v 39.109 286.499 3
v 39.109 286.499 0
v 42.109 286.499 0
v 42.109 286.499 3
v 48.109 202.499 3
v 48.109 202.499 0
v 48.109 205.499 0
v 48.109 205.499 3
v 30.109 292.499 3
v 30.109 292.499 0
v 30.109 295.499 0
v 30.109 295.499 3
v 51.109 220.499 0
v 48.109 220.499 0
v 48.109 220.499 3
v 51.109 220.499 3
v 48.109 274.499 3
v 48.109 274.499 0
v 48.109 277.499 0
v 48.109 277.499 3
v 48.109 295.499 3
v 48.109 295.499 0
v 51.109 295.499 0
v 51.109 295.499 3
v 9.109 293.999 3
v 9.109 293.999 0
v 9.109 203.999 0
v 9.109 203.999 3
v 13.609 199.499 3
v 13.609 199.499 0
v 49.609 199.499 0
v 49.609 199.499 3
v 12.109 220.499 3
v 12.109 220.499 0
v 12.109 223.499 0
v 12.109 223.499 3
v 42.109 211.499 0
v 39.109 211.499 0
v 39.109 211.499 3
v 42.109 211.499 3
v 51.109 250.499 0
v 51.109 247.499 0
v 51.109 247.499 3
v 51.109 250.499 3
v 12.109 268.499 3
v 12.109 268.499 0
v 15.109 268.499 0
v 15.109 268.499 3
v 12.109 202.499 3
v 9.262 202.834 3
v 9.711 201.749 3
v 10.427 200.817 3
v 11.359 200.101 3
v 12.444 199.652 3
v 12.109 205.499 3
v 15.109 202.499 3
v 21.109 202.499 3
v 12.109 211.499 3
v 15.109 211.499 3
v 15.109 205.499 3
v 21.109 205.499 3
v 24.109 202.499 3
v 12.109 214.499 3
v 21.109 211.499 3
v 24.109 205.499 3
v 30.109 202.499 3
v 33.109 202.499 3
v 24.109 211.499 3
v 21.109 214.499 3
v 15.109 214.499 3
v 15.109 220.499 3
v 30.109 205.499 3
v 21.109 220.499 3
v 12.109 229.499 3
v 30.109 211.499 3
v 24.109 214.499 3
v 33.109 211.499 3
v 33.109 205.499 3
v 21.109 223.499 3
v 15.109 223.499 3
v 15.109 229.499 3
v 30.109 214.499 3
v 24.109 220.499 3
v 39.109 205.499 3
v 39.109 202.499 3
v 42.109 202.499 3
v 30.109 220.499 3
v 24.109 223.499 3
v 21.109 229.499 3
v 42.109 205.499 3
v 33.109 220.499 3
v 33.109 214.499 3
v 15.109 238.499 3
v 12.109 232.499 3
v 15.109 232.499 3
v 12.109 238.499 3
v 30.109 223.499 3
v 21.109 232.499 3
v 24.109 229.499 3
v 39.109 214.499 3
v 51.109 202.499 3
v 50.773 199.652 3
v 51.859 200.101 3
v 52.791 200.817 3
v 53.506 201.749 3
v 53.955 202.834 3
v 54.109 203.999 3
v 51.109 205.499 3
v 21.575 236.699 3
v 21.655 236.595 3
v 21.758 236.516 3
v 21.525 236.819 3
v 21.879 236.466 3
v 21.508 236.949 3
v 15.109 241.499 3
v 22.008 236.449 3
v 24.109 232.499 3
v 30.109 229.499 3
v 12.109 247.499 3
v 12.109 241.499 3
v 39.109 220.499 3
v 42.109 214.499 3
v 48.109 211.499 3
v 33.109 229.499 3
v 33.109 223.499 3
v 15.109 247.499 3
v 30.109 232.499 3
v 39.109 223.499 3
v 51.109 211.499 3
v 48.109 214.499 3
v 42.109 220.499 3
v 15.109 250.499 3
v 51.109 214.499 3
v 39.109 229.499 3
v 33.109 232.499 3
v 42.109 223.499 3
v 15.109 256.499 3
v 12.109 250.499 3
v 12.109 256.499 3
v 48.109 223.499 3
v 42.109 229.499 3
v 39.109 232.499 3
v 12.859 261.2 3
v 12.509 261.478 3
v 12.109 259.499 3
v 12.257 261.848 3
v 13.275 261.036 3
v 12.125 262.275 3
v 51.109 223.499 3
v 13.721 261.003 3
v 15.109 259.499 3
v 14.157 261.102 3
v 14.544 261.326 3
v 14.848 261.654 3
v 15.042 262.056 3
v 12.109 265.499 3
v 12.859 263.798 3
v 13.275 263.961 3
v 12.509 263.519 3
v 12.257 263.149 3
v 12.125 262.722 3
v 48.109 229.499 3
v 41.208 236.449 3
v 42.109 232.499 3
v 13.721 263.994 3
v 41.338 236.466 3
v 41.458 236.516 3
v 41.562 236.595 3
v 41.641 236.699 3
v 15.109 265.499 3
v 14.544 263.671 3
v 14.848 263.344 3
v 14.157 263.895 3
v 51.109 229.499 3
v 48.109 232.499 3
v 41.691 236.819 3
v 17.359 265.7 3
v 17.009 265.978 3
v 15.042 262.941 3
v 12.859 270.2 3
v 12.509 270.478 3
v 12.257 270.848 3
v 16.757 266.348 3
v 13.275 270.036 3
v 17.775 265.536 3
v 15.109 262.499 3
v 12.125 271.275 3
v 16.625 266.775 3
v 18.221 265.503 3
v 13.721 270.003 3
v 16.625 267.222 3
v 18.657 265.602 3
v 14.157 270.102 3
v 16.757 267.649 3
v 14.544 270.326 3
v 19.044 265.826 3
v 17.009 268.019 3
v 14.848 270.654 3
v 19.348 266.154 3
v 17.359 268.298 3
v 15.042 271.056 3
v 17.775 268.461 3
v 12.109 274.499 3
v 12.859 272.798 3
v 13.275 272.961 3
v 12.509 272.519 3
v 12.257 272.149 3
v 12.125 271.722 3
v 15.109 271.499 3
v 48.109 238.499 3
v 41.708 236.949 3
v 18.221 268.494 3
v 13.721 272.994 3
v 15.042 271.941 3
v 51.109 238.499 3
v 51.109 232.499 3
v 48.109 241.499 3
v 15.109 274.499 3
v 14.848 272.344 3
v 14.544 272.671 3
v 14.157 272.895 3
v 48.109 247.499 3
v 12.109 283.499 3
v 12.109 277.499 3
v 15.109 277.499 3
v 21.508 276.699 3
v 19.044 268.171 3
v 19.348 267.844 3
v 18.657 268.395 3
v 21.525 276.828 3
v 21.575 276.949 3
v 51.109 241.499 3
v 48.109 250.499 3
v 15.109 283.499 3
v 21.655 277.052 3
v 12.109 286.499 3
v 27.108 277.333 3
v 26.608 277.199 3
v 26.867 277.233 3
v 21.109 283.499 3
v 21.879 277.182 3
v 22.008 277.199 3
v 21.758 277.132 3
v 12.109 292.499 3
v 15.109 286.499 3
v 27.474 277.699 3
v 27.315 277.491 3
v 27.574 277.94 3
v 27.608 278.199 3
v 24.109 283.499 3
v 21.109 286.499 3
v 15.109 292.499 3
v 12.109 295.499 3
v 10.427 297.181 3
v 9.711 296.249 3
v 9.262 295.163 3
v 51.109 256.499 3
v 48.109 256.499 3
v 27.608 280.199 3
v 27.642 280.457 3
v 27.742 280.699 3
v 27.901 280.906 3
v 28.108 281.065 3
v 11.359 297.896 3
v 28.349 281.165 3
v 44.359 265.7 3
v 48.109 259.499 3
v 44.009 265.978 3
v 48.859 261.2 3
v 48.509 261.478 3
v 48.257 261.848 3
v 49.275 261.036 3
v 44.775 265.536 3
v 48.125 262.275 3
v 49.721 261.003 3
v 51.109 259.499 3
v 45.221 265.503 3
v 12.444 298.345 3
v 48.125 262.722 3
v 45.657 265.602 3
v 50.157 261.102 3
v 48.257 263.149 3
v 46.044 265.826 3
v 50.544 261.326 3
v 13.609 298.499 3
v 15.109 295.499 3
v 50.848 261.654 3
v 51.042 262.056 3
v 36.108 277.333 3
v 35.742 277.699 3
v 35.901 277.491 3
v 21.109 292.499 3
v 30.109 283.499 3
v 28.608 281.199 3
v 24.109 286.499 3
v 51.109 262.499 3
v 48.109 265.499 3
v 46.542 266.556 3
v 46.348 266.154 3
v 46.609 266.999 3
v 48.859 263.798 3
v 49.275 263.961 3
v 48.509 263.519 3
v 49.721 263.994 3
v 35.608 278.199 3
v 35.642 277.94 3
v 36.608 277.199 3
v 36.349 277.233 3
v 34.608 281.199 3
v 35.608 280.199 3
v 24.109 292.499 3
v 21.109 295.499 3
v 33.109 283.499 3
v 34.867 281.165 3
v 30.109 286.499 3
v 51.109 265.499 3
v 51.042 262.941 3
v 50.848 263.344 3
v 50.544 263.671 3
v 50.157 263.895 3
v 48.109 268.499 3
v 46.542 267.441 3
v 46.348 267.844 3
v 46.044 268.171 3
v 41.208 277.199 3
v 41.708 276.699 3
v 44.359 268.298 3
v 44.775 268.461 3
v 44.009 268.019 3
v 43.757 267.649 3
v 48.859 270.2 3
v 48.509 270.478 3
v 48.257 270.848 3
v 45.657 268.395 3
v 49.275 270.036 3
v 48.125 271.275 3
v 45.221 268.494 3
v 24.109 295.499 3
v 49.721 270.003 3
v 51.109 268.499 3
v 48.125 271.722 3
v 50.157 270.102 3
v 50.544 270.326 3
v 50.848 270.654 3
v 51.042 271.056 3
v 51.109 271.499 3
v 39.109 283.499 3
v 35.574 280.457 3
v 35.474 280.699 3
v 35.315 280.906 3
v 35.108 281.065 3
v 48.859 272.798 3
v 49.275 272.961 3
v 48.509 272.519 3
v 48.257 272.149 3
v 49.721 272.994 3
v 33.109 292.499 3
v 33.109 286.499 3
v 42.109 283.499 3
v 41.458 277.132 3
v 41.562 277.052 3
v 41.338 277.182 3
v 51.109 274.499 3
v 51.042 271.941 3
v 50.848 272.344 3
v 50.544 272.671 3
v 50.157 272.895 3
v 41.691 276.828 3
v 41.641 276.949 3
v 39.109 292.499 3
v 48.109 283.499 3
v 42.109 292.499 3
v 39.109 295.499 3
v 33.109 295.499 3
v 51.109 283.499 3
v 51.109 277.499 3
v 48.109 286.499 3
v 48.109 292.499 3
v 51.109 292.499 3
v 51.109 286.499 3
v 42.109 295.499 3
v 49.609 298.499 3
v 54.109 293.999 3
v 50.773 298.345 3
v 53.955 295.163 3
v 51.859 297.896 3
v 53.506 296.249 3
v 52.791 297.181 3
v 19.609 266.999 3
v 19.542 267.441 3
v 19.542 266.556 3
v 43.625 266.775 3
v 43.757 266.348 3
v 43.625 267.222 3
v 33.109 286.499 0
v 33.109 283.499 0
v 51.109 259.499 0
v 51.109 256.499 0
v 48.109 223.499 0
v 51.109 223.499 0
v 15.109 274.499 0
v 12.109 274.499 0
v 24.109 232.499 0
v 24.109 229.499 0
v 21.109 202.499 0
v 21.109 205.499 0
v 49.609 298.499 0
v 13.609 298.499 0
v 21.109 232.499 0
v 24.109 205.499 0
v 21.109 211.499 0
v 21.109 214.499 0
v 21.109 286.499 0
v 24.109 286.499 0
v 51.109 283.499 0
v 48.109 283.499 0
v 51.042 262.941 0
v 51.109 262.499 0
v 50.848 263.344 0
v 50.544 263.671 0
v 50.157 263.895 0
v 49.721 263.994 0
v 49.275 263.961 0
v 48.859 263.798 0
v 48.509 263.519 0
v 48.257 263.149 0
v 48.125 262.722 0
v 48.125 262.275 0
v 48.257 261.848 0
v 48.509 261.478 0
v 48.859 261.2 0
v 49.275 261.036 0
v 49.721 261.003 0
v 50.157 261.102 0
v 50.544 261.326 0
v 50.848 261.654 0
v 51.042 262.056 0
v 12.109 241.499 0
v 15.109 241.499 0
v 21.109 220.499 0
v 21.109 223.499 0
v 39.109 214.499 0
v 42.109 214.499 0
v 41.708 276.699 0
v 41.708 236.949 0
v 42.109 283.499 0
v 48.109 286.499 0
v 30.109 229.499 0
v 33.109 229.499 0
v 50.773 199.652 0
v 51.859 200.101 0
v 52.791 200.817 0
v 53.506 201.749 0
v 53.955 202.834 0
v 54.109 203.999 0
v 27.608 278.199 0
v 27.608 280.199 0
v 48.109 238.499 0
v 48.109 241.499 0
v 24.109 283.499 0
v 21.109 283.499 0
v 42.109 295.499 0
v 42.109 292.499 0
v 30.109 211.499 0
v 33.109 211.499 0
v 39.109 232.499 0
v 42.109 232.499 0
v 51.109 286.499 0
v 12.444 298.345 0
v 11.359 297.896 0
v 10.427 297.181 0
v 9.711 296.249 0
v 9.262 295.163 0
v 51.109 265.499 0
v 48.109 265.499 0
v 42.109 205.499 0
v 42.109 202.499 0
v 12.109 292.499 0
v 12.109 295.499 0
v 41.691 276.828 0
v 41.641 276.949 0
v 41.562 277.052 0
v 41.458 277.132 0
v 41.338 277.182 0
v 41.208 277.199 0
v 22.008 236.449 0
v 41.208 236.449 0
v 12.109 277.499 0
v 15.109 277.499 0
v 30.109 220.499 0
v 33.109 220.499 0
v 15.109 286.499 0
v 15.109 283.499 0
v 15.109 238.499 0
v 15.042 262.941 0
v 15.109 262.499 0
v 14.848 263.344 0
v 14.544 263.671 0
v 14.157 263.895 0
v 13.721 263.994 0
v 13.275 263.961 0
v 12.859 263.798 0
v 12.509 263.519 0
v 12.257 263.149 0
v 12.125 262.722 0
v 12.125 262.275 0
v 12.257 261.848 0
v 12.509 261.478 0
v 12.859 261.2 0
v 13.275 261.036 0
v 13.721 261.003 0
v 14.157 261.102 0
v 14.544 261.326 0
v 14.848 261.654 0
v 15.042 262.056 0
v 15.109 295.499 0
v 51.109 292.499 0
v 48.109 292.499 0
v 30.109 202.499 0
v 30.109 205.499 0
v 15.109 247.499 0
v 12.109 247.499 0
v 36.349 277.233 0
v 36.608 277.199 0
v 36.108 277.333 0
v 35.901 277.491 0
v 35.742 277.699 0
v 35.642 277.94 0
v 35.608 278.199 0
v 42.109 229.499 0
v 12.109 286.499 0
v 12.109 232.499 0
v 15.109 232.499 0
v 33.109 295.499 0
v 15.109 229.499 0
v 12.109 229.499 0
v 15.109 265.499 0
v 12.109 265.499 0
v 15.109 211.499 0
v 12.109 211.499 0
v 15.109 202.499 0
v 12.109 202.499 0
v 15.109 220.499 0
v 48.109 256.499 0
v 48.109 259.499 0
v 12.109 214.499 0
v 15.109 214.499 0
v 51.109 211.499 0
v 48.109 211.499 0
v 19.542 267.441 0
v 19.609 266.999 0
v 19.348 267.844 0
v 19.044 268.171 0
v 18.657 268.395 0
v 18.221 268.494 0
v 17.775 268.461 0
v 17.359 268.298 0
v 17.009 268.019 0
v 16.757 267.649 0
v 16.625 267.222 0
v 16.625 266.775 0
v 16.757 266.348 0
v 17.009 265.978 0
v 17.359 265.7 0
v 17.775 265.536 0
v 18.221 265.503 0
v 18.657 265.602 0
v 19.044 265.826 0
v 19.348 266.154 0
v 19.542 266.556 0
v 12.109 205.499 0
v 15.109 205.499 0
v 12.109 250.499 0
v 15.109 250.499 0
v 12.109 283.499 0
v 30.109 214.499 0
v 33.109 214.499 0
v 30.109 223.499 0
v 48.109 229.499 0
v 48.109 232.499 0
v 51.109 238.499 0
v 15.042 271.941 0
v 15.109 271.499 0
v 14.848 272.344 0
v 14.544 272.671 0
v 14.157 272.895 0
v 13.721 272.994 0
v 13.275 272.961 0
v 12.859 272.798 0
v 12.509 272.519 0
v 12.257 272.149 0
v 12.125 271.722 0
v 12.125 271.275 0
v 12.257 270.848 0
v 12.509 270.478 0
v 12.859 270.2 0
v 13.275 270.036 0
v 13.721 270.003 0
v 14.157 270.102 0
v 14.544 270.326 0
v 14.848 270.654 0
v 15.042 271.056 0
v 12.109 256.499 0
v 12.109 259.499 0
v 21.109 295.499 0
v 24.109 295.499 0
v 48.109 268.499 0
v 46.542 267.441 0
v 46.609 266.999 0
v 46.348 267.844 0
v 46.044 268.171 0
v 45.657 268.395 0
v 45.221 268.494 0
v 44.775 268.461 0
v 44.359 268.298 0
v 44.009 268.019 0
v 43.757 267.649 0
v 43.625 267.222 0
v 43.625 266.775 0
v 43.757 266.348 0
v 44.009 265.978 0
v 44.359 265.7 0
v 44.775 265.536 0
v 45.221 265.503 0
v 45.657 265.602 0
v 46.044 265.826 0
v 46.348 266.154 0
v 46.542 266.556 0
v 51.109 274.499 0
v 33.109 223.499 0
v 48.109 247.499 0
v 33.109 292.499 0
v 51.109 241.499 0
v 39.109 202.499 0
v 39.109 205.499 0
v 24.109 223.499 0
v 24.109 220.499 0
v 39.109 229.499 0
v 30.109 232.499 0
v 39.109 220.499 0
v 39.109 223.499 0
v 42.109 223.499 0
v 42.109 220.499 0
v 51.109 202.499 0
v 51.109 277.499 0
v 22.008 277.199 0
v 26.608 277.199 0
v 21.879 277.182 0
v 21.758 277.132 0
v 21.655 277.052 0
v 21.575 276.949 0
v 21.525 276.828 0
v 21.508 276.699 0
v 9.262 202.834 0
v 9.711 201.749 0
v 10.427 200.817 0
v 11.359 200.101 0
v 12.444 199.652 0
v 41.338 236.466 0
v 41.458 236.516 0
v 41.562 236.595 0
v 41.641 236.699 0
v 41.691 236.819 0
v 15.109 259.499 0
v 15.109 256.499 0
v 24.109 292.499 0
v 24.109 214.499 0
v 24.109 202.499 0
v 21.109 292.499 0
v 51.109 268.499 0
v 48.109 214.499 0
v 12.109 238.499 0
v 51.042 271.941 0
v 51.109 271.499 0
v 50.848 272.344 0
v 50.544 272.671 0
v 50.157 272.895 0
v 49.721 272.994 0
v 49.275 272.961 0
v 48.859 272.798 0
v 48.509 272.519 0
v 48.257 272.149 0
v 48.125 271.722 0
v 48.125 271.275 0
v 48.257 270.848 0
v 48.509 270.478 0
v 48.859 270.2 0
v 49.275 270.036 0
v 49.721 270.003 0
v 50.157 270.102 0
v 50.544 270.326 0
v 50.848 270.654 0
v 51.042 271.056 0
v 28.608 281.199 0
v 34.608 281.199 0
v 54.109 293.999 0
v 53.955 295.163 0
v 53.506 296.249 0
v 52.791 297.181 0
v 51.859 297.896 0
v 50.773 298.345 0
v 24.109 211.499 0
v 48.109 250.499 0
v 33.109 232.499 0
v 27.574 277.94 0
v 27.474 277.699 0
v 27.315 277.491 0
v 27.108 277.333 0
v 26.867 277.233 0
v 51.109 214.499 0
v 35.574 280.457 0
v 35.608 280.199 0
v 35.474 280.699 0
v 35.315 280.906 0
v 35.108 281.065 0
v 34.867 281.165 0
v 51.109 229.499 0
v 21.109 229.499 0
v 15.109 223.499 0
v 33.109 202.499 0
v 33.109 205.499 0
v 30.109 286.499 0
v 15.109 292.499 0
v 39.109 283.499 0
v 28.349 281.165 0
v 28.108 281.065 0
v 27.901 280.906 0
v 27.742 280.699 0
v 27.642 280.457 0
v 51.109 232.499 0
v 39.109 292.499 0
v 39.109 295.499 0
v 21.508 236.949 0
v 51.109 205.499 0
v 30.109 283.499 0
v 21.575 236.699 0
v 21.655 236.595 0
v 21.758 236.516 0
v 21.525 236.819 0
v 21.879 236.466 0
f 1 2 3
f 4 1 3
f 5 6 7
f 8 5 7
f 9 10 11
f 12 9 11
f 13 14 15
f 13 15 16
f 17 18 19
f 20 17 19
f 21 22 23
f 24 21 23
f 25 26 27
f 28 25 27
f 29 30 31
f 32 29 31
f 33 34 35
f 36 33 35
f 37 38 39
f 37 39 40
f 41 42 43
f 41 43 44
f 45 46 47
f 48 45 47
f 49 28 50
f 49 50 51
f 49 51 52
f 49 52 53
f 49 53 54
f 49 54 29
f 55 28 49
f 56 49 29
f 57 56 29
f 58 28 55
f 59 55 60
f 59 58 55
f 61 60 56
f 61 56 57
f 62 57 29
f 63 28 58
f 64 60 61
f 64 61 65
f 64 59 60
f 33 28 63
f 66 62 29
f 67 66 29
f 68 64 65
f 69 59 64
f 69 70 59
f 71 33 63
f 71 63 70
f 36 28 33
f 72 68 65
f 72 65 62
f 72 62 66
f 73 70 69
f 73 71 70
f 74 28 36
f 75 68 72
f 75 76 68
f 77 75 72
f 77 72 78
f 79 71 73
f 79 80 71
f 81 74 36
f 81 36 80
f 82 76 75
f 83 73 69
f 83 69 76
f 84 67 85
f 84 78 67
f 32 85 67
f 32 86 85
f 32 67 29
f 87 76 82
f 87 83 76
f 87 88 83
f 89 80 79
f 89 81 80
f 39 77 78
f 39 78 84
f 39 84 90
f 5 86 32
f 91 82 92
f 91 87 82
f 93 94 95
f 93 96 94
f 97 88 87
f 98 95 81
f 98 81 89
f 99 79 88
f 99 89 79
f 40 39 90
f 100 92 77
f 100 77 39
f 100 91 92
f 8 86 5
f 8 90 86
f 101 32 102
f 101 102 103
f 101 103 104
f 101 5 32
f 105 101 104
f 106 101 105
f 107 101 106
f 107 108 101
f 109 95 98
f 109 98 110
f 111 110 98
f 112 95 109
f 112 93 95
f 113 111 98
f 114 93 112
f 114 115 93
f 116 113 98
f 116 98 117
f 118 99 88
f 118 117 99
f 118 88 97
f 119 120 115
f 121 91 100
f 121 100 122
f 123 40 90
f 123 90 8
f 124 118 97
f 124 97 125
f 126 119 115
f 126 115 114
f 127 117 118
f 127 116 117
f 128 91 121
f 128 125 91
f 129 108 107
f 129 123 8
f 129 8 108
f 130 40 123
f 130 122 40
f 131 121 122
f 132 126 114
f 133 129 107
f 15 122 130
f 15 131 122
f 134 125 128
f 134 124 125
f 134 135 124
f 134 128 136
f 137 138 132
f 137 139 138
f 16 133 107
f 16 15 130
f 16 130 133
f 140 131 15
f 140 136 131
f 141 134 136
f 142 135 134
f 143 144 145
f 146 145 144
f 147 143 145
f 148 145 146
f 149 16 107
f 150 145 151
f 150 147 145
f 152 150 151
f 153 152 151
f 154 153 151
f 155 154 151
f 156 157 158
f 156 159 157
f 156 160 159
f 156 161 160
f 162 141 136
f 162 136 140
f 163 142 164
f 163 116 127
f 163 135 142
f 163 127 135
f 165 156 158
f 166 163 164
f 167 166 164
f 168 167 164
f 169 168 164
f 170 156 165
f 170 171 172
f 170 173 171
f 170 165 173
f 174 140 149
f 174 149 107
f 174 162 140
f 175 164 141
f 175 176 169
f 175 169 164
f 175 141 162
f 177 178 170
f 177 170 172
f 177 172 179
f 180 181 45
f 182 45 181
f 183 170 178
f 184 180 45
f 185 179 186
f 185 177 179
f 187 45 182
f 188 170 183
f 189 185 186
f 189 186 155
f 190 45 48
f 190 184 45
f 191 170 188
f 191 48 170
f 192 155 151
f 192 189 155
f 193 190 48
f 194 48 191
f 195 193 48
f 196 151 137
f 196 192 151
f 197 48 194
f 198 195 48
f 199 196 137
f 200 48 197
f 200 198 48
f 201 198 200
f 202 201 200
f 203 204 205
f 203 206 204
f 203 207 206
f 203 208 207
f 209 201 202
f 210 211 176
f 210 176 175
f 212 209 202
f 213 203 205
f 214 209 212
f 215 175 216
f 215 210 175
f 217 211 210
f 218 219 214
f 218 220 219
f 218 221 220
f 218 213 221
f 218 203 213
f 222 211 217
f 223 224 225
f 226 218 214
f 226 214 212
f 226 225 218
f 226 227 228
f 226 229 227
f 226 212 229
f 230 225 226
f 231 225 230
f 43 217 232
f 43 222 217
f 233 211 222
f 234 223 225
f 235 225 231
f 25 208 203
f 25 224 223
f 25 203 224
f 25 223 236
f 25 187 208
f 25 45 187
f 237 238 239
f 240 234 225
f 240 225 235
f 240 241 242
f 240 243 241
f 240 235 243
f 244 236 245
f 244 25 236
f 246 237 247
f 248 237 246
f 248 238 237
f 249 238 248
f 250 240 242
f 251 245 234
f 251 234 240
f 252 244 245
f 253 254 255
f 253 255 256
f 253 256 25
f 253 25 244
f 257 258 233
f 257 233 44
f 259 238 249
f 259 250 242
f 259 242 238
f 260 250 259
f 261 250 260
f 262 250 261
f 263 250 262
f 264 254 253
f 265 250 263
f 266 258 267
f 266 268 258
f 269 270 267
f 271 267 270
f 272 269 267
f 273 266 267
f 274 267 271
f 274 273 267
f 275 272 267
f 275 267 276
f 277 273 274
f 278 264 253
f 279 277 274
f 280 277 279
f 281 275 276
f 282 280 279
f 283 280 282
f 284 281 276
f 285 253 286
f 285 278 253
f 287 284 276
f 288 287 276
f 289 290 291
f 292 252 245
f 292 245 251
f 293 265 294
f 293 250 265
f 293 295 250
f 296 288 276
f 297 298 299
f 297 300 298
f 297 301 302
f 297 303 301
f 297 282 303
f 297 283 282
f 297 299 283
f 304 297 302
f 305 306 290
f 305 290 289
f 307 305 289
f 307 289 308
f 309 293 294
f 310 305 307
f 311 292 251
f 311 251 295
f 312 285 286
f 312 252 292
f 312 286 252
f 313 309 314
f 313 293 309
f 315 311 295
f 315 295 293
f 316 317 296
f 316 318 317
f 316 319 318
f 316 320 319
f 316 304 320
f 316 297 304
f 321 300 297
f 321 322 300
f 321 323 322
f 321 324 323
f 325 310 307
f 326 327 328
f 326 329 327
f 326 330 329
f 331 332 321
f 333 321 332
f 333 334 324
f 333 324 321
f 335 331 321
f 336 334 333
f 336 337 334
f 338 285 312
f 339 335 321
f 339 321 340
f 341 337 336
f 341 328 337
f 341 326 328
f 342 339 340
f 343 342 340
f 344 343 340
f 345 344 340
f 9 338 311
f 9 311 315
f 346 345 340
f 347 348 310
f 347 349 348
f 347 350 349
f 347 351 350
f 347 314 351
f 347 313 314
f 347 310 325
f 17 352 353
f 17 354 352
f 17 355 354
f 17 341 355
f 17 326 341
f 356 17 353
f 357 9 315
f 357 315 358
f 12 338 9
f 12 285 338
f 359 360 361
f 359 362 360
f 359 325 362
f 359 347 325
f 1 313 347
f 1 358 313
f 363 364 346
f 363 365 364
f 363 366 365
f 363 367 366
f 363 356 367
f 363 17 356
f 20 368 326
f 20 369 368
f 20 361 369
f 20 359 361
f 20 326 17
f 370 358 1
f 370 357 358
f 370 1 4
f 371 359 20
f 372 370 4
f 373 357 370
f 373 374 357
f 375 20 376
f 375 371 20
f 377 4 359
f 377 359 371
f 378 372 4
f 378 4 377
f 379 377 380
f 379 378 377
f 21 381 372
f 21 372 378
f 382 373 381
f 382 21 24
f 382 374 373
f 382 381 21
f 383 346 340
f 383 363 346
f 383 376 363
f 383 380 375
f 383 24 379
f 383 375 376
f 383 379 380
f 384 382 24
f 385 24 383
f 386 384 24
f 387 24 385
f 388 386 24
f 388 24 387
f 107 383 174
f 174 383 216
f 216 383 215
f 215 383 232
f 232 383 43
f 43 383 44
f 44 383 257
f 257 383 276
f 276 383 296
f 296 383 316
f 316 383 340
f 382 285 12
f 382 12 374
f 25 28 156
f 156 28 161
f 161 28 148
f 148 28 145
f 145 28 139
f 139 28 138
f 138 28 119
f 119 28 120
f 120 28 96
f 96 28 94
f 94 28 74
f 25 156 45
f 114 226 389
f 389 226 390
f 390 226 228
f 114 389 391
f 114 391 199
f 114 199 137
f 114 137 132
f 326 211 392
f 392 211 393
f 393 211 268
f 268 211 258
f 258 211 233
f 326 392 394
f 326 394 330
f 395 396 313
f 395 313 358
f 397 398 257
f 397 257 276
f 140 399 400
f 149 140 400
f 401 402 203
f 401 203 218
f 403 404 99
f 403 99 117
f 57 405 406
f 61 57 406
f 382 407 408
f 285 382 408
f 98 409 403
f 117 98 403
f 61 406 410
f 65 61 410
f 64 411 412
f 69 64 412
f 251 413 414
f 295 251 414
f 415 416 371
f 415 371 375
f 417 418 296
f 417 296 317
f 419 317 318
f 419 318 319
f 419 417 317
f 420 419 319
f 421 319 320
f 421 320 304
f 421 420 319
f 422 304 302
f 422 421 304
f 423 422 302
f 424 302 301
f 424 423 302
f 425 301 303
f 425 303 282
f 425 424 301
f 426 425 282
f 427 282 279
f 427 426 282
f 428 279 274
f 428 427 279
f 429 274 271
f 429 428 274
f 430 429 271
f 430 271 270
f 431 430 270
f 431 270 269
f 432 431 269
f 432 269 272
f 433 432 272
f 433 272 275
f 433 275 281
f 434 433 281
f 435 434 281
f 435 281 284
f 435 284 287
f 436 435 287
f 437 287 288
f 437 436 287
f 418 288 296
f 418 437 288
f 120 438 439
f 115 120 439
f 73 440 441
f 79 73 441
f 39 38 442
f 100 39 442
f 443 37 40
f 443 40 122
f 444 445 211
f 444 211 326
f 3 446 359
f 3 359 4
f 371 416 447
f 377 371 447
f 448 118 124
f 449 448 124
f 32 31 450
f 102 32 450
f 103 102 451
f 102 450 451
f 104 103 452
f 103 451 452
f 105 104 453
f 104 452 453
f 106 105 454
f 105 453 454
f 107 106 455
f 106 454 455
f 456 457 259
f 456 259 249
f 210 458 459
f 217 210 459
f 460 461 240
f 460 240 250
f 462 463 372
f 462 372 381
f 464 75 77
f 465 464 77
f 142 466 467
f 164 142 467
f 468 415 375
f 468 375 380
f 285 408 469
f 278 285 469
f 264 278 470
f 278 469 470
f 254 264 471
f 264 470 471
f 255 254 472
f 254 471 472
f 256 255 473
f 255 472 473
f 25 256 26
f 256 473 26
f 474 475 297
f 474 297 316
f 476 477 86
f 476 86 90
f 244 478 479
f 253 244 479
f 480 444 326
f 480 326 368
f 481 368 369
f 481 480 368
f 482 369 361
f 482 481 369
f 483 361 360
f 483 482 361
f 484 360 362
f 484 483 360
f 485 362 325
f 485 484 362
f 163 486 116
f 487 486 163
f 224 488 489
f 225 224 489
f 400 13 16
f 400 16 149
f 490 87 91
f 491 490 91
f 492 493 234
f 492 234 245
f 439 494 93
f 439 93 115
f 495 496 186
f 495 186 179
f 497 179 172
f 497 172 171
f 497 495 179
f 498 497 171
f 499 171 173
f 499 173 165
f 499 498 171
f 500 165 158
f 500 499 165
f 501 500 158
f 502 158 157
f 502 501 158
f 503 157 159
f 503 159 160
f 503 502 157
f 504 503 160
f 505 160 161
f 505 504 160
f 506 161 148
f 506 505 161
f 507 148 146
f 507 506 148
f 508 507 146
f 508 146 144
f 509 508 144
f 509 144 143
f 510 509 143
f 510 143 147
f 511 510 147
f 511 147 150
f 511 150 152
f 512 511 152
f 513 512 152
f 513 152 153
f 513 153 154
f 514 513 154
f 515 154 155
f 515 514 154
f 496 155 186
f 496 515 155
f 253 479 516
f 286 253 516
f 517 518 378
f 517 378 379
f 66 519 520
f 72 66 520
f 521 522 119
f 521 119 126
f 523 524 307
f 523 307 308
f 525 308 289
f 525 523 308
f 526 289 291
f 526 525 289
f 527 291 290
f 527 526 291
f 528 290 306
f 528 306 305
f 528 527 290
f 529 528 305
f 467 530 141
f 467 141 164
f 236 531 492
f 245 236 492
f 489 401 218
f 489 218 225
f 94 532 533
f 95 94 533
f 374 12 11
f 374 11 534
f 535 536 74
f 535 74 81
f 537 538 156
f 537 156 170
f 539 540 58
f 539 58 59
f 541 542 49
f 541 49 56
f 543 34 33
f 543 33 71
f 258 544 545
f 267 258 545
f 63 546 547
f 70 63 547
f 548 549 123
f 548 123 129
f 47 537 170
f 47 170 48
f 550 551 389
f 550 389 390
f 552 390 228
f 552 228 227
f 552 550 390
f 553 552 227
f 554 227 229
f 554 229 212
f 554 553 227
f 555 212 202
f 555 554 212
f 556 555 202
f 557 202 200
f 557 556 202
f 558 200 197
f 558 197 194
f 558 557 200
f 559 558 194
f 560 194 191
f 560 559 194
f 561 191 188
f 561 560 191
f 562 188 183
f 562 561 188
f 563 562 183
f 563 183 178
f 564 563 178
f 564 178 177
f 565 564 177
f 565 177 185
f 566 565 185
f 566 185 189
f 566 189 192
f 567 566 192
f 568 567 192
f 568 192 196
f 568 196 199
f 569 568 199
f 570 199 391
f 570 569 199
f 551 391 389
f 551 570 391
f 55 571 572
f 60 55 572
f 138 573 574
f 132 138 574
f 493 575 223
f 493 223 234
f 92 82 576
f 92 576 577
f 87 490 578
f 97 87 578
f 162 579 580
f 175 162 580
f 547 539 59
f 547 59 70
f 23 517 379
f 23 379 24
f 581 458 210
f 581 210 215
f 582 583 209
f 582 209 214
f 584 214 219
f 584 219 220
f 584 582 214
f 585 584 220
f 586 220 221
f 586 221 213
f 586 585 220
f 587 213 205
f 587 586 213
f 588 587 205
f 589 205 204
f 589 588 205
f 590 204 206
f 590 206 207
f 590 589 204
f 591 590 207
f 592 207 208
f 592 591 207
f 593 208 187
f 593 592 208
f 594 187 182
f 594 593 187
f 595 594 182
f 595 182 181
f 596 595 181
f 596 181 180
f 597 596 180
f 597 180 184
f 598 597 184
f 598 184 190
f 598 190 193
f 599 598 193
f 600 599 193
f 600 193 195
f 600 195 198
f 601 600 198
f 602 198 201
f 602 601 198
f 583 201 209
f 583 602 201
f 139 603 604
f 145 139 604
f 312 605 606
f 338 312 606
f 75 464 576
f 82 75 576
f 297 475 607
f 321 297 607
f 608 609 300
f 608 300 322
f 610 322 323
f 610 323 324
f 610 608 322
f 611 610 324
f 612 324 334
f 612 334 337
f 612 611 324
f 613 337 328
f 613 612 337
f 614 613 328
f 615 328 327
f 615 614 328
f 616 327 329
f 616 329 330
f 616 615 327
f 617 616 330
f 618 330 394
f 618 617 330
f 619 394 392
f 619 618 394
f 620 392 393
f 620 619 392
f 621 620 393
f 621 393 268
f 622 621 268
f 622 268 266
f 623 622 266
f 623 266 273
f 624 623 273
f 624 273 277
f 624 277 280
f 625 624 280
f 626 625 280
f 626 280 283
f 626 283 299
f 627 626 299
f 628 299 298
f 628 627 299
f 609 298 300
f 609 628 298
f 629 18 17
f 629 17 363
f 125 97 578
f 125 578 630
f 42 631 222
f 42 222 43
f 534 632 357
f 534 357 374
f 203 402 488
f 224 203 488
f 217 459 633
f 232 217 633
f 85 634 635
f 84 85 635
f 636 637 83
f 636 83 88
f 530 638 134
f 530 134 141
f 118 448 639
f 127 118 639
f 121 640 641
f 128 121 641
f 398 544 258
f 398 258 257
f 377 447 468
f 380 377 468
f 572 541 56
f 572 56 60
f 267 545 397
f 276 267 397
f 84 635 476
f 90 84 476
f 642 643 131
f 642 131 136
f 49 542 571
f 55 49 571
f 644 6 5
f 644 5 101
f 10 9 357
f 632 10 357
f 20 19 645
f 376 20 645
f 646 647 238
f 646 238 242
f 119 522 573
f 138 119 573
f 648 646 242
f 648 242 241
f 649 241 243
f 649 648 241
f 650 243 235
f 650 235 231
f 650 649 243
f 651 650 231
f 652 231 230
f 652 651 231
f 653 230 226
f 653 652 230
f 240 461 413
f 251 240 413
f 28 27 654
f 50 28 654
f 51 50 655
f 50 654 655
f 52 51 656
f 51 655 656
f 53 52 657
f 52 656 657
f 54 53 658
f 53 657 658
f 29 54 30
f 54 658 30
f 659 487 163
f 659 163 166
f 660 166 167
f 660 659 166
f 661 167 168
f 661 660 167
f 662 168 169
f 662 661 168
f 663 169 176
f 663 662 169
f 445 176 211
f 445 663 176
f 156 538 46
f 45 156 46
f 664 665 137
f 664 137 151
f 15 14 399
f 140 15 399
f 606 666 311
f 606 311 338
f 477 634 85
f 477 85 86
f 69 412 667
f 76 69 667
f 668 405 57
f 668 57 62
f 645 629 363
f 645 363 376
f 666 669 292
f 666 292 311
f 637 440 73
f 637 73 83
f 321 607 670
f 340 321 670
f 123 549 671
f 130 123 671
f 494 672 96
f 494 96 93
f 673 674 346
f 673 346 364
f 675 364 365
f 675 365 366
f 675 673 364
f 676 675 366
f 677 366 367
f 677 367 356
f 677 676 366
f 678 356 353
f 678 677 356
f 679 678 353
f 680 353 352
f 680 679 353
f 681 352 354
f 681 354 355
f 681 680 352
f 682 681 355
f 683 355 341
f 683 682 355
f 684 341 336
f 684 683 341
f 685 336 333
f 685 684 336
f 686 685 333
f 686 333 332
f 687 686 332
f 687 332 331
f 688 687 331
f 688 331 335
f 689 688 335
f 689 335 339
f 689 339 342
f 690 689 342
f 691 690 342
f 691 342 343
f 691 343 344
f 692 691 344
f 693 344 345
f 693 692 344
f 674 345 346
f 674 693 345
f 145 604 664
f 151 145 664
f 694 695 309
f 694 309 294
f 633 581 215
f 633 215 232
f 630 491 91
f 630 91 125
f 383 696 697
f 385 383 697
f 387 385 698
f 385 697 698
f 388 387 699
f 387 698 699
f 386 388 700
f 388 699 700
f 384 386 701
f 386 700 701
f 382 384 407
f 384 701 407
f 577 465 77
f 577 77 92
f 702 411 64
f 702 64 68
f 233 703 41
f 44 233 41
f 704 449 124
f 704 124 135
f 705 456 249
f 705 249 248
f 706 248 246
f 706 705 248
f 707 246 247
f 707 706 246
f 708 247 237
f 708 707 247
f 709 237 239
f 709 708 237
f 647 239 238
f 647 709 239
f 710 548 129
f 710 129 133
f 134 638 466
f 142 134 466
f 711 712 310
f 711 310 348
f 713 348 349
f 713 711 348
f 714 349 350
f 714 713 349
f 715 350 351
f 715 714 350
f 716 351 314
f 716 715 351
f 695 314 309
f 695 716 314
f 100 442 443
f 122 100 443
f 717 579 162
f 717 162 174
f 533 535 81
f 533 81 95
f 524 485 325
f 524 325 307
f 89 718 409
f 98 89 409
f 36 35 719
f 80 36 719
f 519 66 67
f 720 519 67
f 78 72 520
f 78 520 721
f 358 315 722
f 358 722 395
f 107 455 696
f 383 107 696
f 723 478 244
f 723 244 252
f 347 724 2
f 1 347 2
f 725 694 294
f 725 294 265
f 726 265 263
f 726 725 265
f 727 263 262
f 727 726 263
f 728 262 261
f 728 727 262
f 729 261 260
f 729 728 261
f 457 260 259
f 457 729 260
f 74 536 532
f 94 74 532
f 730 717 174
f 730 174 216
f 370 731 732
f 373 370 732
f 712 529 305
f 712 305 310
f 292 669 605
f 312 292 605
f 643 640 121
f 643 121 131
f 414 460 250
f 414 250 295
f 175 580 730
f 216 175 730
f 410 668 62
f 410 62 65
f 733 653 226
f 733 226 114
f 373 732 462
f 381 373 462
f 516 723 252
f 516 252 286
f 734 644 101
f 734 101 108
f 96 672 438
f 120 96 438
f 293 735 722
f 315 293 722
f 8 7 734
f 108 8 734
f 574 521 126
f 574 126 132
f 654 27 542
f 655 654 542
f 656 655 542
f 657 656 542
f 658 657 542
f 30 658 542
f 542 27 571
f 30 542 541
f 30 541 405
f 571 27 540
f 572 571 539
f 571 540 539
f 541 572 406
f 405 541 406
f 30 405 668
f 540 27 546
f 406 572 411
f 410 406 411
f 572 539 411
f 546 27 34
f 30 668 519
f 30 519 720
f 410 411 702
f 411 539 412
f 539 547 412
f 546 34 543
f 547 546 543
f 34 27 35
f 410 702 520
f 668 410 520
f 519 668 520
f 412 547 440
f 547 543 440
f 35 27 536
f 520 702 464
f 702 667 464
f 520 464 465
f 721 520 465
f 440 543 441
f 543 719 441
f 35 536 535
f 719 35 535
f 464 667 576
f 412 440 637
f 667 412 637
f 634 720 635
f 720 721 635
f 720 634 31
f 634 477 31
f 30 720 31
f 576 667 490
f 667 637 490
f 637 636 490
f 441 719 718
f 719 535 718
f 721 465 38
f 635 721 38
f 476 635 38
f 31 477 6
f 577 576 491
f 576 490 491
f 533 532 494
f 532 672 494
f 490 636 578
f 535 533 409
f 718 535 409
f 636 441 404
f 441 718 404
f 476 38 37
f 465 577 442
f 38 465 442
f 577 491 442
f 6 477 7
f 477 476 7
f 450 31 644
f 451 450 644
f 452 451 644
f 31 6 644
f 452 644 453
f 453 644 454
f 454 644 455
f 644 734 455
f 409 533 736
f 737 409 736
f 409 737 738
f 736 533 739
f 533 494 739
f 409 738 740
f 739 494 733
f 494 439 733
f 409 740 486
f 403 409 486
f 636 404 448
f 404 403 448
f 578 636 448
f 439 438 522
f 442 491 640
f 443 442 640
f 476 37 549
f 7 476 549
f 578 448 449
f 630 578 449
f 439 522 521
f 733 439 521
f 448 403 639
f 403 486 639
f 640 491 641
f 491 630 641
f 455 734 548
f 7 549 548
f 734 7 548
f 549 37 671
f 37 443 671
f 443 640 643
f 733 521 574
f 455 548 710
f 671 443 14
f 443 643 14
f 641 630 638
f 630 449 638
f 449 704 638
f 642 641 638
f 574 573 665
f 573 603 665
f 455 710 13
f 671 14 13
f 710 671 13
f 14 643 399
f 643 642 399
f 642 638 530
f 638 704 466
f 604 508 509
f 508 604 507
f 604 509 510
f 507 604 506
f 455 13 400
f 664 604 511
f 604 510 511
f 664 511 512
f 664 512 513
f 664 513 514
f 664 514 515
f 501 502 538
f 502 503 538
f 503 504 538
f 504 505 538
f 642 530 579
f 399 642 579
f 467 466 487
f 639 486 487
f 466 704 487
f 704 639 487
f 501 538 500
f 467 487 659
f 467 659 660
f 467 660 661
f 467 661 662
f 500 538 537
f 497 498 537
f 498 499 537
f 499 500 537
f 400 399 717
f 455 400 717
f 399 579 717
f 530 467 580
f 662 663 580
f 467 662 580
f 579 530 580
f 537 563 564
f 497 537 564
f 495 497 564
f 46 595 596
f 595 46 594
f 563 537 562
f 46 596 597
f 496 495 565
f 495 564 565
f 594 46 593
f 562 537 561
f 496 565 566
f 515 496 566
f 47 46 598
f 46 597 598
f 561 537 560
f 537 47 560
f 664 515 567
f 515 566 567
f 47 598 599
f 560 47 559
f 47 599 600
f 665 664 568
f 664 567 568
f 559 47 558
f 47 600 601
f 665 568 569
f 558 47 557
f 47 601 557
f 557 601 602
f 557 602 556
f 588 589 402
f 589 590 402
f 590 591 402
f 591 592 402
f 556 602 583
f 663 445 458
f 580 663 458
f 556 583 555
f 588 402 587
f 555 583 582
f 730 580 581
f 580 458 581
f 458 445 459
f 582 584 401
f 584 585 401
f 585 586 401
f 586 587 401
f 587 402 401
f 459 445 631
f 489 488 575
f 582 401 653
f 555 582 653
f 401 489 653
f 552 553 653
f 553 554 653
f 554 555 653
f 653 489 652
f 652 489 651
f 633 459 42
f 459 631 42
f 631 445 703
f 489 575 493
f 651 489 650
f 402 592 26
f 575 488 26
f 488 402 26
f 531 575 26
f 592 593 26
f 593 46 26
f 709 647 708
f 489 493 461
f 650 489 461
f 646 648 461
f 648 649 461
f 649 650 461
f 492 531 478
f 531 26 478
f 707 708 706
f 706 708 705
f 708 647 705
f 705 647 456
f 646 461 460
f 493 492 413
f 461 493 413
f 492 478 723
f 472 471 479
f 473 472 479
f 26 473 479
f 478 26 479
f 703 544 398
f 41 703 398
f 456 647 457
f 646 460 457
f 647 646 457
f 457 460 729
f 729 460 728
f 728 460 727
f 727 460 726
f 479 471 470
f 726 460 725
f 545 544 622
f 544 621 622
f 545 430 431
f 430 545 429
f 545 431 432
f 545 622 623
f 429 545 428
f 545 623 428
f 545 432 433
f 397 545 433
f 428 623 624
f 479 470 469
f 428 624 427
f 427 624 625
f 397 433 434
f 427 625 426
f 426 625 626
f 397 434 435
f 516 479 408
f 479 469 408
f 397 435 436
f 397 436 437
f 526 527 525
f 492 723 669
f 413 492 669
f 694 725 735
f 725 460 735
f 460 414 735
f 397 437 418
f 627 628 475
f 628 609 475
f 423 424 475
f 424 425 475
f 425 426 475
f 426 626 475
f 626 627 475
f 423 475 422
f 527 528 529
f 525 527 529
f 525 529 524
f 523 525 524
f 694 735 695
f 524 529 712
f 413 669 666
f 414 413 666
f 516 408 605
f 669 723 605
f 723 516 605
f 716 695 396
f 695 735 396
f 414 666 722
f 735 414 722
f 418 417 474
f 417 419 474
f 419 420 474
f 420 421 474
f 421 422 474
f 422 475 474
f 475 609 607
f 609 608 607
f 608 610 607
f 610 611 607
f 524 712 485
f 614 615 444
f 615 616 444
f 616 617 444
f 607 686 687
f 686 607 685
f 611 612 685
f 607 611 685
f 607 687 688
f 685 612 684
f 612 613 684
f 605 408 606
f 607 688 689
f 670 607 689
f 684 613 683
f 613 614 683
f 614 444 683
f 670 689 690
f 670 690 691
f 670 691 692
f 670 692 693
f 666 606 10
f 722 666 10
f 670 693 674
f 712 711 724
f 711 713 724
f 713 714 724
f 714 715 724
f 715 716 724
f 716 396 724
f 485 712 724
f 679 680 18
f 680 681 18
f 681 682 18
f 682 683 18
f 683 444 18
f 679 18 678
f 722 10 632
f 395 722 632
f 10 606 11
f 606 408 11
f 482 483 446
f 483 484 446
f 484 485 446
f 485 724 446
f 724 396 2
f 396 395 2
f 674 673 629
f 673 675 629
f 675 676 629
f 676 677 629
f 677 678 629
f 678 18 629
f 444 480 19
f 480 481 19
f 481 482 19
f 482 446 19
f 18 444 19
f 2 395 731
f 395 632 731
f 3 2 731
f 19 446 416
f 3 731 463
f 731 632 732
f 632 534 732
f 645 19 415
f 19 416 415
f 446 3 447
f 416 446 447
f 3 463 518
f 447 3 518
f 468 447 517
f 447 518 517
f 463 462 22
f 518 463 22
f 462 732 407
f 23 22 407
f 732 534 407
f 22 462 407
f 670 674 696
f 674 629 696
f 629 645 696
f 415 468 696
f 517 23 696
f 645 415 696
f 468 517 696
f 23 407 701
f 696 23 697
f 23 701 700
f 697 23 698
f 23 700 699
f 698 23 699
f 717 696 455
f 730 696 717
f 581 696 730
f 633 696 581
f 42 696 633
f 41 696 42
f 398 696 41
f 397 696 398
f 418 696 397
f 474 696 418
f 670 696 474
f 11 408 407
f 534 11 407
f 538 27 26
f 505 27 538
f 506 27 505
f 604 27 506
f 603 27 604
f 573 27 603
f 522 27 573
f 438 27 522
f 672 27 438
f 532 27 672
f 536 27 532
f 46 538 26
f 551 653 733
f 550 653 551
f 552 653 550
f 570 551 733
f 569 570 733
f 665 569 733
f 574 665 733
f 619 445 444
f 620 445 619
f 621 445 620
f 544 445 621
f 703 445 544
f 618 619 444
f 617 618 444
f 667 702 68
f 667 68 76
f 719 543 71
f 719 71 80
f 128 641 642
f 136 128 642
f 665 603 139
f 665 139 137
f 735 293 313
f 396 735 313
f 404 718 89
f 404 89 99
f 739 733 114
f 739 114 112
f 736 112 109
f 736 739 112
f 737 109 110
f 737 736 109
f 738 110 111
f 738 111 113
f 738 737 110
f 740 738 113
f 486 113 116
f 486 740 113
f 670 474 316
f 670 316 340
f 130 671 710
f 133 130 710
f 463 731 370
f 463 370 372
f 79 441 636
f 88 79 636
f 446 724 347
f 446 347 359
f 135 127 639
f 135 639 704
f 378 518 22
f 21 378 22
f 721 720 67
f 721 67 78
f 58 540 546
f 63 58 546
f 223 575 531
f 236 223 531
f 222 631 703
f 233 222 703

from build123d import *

# Parameters (mm, degrees)
MODEL_R                 = 1.5
MODEL_W                 = 3
MODEL_H                 = 3
SALIENTE_EXTRUIR1_DEPTH = 3


with BuildPart() as part:
    # Model → Saliente-Extruir1 (new body)
    with BuildSketch(Plane.XY):
        with BuildLine():
            Line((13.608524471, 199.498543913), (49.608524471, 199.498543913))
            ThreePointArc((49.608524471, 199.498543913), (52.790504986, 200.816563398), (54.108524471, 203.998543913))
            Line((54.108524471, 203.998543913), (54.108524471, 293.998543913))
            ThreePointArc((54.108524471, 293.998543913), (52.790504986, 297.180524429), (49.608524471, 298.498543913))
            Line((49.608524471, 298.498543913), (13.608524471, 298.498543913))
            ThreePointArc((13.608524471, 298.498543913), (10.426543955, 297.180524429), (9.108524471, 293.998543913))
            Line((9.108524471, 293.998543913), (9.108524471, 203.998543913))
            ThreePointArc((9.108524471, 203.998543913), (10.426543955, 200.816563398), (13.608524471, 199.498543913))
        make_face()
        with Locations((45.108524471, 266.998543913)):
            Circle(MODEL_R, mode=Mode.SUBTRACT)
        with Locations((18.108524471, 266.998543913)):
            Circle(MODEL_R, mode=Mode.SUBTRACT)
        with Locations((49.608524471, 262.498543913)):
            Circle(MODEL_R, mode=Mode.SUBTRACT)
        with Locations((49.608524471, 271.498543913)):
            Circle(MODEL_R, mode=Mode.SUBTRACT)
        with Locations((13.608524471, 262.498543913)):
            Circle(MODEL_R, mode=Mode.SUBTRACT)
        with Locations((13.608524471, 271.498543913)):
            Circle(MODEL_R, mode=Mode.SUBTRACT)
        with Locations((49.608524471, 293.998543913)):
            Rectangle(MODEL_W, MODEL_H, mode=Mode.SUBTRACT)
        with Locations((49.608524471, 284.998543913)):
            Rectangle(MODEL_W, MODEL_H, mode=Mode.SUBTRACT)
        with Locations((49.608524471, 275.998543913)):
            Rectangle(MODEL_W, MODEL_H, mode=Mode.SUBTRACT)
        with Locations((49.608524471, 266.998543913)):
            Rectangle(MODEL_W, MODEL_H, mode=Mode.SUBTRACT)
        with Locations((49.608524471, 257.998543913)):
            Rectangle(MODEL_W, MODEL_H, mode=Mode.SUBTRACT)
        with Locations((49.608524471, 248.998543913)):
            Rectangle(MODEL_W, MODEL_H, mode=Mode.SUBTRACT)
        with Locations((49.608524471, 239.998543913)):
            Rectangle(MODEL_W, MODEL_H, mode=Mode.SUBTRACT)
        with Locations((49.608524471, 230.998543913)):
            Rectangle(MODEL_W, MODEL_H, mode=Mode.SUBTRACT)
        with Locations((49.608524471, 221.998543913)):
            Rectangle(MODEL_W, MODEL_H, mode=Mode.SUBTRACT)
        with Locations((49.608524471, 212.998543913)):
            Rectangle(MODEL_W, MODEL_H, mode=Mode.SUBTRACT)
        with Locations((49.608524471, 203.998543913)):
            Rectangle(MODEL_W, MODEL_H, mode=Mode.SUBTRACT)
        with Locations((13.608524471, 293.998543913)):
            Rectangle(MODEL_W, MODEL_H, mode=Mode.SUBTRACT)
        with Locations((13.608524471, 284.998543913)):
            Rectangle(MODEL_W, MODEL_H, mode=Mode.SUBTRACT)
        with Locations((13.608524471, 275.998543913)):
            Rectangle(MODEL_W, MODEL_H, mode=Mode.SUBTRACT)
        with Locations((13.608524471, 266.998543913)):
            Rectangle(MODEL_W, MODEL_H, mode=Mode.SUBTRACT)
        with Locations((13.608524471, 257.998543913)):
            Rectangle(MODEL_W, MODEL_H, mode=Mode.SUBTRACT)
        with Locations((13.608524471, 248.998543913)):
            Rectangle(MODEL_W, MODEL_H, mode=Mode.SUBTRACT)
        with Locations((13.608524471, 239.998543913)):
            Rectangle(MODEL_W, MODEL_H, mode=Mode.SUBTRACT)
        with Locations((13.608524471, 230.998543913)):
            Rectangle(MODEL_W, MODEL_H, mode=Mode.SUBTRACT)
        with Locations((13.608524471, 221.998543913)):
            Rectangle(MODEL_W, MODEL_H, mode=Mode.SUBTRACT)
        with Locations((13.608524471, 212.998543913)):
            Rectangle(MODEL_W, MODEL_H, mode=Mode.SUBTRACT)
        with Locations((13.608524471, 203.998543913)):
            Rectangle(MODEL_W, MODEL_H, mode=Mode.SUBTRACT)
        with Locations((40.608524471, 203.998543913)):
            Rectangle(MODEL_W, MODEL_H, mode=Mode.SUBTRACT)
        with Locations((22.608524471, 203.998543913)):
            Rectangle(MODEL_W, MODEL_H, mode=Mode.SUBTRACT)
        with Locations((31.608524471, 203.998543913)):
            Rectangle(MODEL_W, MODEL_H, mode=Mode.SUBTRACT)
        with Locations((40.608524471, 221.998543913)):
            Rectangle(MODEL_W, MODEL_H, mode=Mode.SUBTRACT)
        with Locations((22.608524471, 221.998543913)):
            Rectangle(MODEL_W, MODEL_H, mode=Mode.SUBTRACT)
        with Locations((31.608524471, 221.998543913)):
            Rectangle(MODEL_W, MODEL_H, mode=Mode.SUBTRACT)
        with Locations((40.608524471, 212.998543913)):
            Rectangle(MODEL_W, MODEL_H, mode=Mode.SUBTRACT)
        with Locations((22.608524471, 212.998543913)):
            Rectangle(MODEL_W, MODEL_H, mode=Mode.SUBTRACT)
        with Locations((31.608524471, 212.998543913)):
            Rectangle(MODEL_W, MODEL_H, mode=Mode.SUBTRACT)
        with Locations((40.608524471, 293.998543913)):
            Rectangle(MODEL_W, MODEL_H, mode=Mode.SUBTRACT)
        with Locations((22.608524471, 293.998543913)):
            Rectangle(MODEL_W, MODEL_H, mode=Mode.SUBTRACT)
        with Locations((31.608524471, 293.998543913)):
            Rectangle(MODEL_W, MODEL_H, mode=Mode.SUBTRACT)
        with Locations((40.608524471, 284.998543913)):
            Rectangle(MODEL_W, MODEL_H, mode=Mode.SUBTRACT)
        with Locations((22.608524471, 284.998543913)):
            Rectangle(MODEL_W, MODEL_H, mode=Mode.SUBTRACT)
        with Locations((40.608524471, 230.998543913)):
            Rectangle(MODEL_W, MODEL_H, mode=Mode.SUBTRACT)
        with Locations((22.608524471, 230.998543913)):
            Rectangle(MODEL_W, MODEL_H, mode=Mode.SUBTRACT)
        with Locations((31.608524471, 230.998543913)):
            Rectangle(MODEL_W, MODEL_H, mode=Mode.SUBTRACT)
        with Locations((31.608524471, 284.998543913)):
            Rectangle(MODEL_W, MODEL_H, mode=Mode.SUBTRACT)
        with BuildLine():
            Line((21.508214184, 276.698579599), (21.508214184, 236.948579599))
            ThreePointArc((21.508214184, 236.948579599), (21.654660793, 236.595026209), (22.008214184, 236.448579599))
            Line((22.008214184, 236.448579599), (41.208214184, 236.448579599))
            ThreePointArc((41.208214184, 236.448579599), (41.561767574, 236.595026209), (41.708214184, 236.948579599))
            Line((41.708214184, 236.948579599), (41.708214184, 276.698579599))
            ThreePointArc((41.708214184, 276.698579599), (41.561767574, 277.05213299), (41.208214184, 277.198579599))
            Line((41.208214184, 277.198579599), (36.608214184, 277.198579599))
            ThreePointArc((36.608214184, 277.198579599), (35.901107403, 277.491472818), (35.608214184, 278.198579599))
            Line((35.608214184, 278.198579599), (35.608214184, 280.198579599))
            ThreePointArc((35.608214184, 280.198579599), (35.315320965, 280.905686381), (34.608214184, 281.198579599))
            Line((34.608214184, 281.198579599), (28.608214184, 281.198579599))
            ThreePointArc((28.608214184, 281.198579599), (27.901107403, 280.905686381), (27.608214184, 280.198579599))
            Line((27.608214184, 280.198579599), (27.608214184, 278.198579599))
            ThreePointArc((27.608214184, 278.198579599), (27.315320965, 277.491472818), (26.608214184, 277.198579599))
            Line((26.608214184, 277.198579599), (22.008214184, 277.198579599))
            ThreePointArc((22.008214184, 277.198579599), (21.654660793, 277.05213299), (21.508214184, 276.698579599))
        make_face(mode=Mode.SUBTRACT)
    extrude(amount=SALIENTE_EXTRUIR1_DEPTH)


solid = part.part
